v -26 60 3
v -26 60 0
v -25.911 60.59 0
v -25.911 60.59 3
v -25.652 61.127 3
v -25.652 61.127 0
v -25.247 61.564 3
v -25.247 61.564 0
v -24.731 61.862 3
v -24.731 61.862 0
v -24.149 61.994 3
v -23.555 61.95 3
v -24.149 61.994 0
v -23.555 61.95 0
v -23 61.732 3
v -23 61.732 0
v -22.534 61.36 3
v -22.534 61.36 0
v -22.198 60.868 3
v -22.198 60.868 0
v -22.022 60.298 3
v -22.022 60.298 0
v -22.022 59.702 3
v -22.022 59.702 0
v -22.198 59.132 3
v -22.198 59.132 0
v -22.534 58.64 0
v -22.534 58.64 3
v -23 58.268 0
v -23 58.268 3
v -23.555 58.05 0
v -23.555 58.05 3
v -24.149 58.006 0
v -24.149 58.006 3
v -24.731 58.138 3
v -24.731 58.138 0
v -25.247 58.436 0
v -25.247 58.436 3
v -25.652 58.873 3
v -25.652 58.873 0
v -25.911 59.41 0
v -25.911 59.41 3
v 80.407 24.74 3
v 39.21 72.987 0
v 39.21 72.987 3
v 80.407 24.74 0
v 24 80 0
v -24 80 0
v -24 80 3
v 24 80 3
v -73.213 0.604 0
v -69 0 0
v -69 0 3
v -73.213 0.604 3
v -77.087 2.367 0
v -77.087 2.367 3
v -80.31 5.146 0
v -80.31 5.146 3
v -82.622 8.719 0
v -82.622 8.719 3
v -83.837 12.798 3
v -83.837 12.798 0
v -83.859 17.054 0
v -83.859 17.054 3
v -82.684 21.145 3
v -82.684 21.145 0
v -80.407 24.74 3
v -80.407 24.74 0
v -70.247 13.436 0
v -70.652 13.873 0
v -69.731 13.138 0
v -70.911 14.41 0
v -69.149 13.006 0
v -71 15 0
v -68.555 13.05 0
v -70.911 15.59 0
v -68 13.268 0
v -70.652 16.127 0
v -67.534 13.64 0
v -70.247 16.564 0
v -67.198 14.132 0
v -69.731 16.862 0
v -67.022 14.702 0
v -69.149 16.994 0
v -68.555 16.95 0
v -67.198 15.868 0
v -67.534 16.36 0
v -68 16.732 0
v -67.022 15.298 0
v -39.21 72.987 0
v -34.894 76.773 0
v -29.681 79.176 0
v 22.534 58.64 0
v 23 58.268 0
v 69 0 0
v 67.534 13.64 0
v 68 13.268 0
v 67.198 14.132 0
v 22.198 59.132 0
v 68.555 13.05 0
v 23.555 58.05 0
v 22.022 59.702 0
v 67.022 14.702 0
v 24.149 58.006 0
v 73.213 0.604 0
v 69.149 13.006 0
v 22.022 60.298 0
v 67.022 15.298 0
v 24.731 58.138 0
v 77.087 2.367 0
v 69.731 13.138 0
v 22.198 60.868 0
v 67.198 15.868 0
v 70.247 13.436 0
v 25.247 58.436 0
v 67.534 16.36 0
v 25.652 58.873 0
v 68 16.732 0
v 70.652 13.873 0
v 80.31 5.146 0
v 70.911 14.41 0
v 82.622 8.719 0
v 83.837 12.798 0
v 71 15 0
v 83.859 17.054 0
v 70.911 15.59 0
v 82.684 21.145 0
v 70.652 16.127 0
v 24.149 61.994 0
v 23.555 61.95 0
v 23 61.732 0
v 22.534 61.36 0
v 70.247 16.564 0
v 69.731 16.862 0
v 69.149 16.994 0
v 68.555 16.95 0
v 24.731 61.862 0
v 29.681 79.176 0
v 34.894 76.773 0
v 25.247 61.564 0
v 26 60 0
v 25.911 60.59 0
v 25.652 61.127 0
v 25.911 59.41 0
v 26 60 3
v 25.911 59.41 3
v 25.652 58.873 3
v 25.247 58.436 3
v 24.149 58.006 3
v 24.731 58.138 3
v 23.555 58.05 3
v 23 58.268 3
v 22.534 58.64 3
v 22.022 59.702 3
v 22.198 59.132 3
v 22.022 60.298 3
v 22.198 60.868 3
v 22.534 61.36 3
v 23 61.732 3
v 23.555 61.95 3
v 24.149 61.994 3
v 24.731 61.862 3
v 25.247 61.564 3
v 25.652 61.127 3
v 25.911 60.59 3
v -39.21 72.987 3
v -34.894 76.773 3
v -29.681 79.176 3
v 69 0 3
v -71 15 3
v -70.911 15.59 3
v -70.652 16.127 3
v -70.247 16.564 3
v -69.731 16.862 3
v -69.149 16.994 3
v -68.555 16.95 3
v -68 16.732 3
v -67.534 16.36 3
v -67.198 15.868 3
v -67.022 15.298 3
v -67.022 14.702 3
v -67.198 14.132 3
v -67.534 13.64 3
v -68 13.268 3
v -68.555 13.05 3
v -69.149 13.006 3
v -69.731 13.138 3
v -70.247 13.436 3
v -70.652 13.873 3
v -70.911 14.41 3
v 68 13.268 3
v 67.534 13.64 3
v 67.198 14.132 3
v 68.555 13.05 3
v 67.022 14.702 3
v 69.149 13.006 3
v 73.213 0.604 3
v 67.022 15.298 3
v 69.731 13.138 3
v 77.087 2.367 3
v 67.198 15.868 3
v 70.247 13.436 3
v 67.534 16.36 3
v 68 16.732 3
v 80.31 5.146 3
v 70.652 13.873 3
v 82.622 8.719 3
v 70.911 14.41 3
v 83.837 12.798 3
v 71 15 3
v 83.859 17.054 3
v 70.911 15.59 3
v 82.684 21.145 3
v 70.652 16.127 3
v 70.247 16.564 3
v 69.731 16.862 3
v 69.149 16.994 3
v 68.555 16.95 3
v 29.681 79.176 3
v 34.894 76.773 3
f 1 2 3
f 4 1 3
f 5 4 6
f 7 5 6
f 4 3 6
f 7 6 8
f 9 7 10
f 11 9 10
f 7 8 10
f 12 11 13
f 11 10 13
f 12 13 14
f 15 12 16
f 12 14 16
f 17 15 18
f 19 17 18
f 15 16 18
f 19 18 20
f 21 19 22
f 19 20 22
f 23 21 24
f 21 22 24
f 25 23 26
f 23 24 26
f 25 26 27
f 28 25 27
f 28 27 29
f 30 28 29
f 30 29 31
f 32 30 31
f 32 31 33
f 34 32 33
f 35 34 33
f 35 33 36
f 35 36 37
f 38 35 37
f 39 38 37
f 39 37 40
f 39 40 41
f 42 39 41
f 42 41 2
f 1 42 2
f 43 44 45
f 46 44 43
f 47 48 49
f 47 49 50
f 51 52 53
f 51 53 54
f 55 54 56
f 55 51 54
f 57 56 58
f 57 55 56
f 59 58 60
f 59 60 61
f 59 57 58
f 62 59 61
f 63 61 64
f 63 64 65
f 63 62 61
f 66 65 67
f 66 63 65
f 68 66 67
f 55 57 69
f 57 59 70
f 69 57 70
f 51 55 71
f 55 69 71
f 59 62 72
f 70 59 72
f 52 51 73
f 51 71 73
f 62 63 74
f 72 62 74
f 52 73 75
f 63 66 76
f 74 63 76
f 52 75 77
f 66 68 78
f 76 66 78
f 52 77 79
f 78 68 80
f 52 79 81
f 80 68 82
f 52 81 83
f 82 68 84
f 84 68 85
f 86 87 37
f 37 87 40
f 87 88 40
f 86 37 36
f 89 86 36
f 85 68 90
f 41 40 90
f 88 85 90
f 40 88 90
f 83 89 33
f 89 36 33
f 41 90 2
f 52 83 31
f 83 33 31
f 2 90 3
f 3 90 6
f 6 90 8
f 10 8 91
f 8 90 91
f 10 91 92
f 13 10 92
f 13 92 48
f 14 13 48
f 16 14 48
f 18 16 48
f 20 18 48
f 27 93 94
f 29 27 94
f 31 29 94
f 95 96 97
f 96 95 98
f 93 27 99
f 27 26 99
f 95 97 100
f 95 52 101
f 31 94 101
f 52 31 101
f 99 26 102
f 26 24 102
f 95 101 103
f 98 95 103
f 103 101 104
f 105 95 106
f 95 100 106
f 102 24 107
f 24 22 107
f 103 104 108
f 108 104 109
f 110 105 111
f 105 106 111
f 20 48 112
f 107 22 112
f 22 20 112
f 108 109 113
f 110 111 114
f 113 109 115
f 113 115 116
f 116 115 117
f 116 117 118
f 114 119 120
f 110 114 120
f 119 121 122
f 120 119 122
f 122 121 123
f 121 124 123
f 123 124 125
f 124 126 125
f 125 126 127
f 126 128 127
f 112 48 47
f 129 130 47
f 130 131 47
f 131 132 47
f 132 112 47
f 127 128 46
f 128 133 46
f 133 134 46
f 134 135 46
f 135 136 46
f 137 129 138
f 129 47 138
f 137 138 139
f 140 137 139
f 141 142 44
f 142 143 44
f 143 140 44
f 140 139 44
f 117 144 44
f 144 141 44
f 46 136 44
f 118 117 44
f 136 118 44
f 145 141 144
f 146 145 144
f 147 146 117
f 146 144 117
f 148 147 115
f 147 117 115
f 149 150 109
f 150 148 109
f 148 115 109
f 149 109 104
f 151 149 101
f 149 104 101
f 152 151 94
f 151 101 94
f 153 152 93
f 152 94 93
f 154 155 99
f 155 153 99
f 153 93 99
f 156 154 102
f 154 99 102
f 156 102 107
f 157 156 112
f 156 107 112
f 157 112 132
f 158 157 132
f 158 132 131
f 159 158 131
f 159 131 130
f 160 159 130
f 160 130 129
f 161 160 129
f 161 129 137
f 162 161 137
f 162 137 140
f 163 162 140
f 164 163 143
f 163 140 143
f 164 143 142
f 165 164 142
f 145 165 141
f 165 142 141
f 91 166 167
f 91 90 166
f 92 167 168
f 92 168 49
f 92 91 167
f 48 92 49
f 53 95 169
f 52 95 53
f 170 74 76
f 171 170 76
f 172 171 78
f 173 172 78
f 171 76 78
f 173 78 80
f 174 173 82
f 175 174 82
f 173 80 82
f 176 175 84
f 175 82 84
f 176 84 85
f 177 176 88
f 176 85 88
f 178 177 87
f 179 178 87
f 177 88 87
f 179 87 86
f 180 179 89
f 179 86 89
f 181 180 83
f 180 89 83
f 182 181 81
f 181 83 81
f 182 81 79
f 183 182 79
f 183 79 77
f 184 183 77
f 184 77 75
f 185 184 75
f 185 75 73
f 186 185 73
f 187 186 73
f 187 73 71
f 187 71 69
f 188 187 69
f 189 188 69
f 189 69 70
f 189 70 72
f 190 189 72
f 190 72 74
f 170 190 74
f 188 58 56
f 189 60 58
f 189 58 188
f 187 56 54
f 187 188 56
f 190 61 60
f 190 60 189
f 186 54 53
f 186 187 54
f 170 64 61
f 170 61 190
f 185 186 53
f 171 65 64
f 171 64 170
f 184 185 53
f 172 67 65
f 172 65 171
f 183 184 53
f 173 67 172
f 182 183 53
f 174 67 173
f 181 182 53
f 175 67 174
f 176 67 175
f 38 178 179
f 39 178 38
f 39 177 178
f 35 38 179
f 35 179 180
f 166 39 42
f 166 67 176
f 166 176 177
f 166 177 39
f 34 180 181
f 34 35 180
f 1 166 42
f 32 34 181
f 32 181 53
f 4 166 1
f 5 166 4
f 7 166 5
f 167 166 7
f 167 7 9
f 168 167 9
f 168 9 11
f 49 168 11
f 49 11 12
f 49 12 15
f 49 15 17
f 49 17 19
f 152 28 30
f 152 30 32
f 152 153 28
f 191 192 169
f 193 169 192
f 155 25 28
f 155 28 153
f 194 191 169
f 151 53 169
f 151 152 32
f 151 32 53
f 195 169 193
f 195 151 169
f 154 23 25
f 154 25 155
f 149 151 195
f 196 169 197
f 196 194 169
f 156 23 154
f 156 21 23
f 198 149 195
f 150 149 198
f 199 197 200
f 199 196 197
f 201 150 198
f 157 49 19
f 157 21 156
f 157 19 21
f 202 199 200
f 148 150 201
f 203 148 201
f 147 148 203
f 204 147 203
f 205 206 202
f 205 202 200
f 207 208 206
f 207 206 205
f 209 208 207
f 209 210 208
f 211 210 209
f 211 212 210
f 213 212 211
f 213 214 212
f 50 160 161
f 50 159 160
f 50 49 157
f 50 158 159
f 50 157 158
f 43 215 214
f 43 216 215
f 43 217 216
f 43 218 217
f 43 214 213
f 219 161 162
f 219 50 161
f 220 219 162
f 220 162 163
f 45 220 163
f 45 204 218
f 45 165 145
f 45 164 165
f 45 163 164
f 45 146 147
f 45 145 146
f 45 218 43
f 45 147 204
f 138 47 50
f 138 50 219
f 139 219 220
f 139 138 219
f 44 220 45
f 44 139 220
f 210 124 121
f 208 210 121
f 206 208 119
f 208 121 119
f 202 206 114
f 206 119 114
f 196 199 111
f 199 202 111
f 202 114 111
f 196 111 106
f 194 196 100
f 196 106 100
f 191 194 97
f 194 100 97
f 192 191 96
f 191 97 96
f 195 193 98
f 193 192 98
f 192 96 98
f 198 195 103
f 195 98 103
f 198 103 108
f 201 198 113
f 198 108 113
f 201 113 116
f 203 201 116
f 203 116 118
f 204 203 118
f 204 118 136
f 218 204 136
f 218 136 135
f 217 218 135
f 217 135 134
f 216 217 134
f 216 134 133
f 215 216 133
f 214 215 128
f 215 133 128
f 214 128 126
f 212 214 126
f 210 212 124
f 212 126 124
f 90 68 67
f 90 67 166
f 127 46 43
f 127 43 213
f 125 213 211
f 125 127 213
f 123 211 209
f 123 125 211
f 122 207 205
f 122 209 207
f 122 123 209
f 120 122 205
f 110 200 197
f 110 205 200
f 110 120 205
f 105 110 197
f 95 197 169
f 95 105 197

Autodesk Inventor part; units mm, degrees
ref_plane "YZ Plane" through (0, 0, 0) normal (1, 0, 0) x (0, 1, 0)
ref_plane "XZ Plane" through (0, 0, 0) normal (0, 1, 0) x (-1, 0, 0)
ref_plane "XY Plane" through (0, 0, 0) normal (0, 0, 1) x (1, 0, 0)
sketch "Sketch1" plane through (0, 0, 0) normal (0, 0, 1) x (1, 0, 0)
  line L0 (0, 80) -> (0, 0)
  line L1 (0, 80) -> (24, 80)
  arc A0 (39.2095, 72.9873) -> (24, 80) centre (24, 60) ccw
  line L2 (39.2095, 72.9873) -> (80.4071, 24.7405)
  arc A1 (69, 0) -> (80.4071, 24.7405) centre (69, 15) ccw
  line L3 (69, 0) -> (0, 0)
  circle A2 centre (24, 60) radius 2
  circle A3 centre (69, 15) radius 2
  dimension "d0" = 24
  dimension "d1" = 20
  dimension "d2" = 45
  dimension "d3" = 45
  dimension "d4" = 15
  dimension "d5" = 4
  dimension "d6" = 4
extrude "Extrusion1" add sketch "Sketch1" along normal blind 3
mirror "Mirror1" about plane through (0, 0, 0) normal (1, 0, 0) of "Extrusion1"
equation "\"d3\" = d2"
properties part number "clawBase"
